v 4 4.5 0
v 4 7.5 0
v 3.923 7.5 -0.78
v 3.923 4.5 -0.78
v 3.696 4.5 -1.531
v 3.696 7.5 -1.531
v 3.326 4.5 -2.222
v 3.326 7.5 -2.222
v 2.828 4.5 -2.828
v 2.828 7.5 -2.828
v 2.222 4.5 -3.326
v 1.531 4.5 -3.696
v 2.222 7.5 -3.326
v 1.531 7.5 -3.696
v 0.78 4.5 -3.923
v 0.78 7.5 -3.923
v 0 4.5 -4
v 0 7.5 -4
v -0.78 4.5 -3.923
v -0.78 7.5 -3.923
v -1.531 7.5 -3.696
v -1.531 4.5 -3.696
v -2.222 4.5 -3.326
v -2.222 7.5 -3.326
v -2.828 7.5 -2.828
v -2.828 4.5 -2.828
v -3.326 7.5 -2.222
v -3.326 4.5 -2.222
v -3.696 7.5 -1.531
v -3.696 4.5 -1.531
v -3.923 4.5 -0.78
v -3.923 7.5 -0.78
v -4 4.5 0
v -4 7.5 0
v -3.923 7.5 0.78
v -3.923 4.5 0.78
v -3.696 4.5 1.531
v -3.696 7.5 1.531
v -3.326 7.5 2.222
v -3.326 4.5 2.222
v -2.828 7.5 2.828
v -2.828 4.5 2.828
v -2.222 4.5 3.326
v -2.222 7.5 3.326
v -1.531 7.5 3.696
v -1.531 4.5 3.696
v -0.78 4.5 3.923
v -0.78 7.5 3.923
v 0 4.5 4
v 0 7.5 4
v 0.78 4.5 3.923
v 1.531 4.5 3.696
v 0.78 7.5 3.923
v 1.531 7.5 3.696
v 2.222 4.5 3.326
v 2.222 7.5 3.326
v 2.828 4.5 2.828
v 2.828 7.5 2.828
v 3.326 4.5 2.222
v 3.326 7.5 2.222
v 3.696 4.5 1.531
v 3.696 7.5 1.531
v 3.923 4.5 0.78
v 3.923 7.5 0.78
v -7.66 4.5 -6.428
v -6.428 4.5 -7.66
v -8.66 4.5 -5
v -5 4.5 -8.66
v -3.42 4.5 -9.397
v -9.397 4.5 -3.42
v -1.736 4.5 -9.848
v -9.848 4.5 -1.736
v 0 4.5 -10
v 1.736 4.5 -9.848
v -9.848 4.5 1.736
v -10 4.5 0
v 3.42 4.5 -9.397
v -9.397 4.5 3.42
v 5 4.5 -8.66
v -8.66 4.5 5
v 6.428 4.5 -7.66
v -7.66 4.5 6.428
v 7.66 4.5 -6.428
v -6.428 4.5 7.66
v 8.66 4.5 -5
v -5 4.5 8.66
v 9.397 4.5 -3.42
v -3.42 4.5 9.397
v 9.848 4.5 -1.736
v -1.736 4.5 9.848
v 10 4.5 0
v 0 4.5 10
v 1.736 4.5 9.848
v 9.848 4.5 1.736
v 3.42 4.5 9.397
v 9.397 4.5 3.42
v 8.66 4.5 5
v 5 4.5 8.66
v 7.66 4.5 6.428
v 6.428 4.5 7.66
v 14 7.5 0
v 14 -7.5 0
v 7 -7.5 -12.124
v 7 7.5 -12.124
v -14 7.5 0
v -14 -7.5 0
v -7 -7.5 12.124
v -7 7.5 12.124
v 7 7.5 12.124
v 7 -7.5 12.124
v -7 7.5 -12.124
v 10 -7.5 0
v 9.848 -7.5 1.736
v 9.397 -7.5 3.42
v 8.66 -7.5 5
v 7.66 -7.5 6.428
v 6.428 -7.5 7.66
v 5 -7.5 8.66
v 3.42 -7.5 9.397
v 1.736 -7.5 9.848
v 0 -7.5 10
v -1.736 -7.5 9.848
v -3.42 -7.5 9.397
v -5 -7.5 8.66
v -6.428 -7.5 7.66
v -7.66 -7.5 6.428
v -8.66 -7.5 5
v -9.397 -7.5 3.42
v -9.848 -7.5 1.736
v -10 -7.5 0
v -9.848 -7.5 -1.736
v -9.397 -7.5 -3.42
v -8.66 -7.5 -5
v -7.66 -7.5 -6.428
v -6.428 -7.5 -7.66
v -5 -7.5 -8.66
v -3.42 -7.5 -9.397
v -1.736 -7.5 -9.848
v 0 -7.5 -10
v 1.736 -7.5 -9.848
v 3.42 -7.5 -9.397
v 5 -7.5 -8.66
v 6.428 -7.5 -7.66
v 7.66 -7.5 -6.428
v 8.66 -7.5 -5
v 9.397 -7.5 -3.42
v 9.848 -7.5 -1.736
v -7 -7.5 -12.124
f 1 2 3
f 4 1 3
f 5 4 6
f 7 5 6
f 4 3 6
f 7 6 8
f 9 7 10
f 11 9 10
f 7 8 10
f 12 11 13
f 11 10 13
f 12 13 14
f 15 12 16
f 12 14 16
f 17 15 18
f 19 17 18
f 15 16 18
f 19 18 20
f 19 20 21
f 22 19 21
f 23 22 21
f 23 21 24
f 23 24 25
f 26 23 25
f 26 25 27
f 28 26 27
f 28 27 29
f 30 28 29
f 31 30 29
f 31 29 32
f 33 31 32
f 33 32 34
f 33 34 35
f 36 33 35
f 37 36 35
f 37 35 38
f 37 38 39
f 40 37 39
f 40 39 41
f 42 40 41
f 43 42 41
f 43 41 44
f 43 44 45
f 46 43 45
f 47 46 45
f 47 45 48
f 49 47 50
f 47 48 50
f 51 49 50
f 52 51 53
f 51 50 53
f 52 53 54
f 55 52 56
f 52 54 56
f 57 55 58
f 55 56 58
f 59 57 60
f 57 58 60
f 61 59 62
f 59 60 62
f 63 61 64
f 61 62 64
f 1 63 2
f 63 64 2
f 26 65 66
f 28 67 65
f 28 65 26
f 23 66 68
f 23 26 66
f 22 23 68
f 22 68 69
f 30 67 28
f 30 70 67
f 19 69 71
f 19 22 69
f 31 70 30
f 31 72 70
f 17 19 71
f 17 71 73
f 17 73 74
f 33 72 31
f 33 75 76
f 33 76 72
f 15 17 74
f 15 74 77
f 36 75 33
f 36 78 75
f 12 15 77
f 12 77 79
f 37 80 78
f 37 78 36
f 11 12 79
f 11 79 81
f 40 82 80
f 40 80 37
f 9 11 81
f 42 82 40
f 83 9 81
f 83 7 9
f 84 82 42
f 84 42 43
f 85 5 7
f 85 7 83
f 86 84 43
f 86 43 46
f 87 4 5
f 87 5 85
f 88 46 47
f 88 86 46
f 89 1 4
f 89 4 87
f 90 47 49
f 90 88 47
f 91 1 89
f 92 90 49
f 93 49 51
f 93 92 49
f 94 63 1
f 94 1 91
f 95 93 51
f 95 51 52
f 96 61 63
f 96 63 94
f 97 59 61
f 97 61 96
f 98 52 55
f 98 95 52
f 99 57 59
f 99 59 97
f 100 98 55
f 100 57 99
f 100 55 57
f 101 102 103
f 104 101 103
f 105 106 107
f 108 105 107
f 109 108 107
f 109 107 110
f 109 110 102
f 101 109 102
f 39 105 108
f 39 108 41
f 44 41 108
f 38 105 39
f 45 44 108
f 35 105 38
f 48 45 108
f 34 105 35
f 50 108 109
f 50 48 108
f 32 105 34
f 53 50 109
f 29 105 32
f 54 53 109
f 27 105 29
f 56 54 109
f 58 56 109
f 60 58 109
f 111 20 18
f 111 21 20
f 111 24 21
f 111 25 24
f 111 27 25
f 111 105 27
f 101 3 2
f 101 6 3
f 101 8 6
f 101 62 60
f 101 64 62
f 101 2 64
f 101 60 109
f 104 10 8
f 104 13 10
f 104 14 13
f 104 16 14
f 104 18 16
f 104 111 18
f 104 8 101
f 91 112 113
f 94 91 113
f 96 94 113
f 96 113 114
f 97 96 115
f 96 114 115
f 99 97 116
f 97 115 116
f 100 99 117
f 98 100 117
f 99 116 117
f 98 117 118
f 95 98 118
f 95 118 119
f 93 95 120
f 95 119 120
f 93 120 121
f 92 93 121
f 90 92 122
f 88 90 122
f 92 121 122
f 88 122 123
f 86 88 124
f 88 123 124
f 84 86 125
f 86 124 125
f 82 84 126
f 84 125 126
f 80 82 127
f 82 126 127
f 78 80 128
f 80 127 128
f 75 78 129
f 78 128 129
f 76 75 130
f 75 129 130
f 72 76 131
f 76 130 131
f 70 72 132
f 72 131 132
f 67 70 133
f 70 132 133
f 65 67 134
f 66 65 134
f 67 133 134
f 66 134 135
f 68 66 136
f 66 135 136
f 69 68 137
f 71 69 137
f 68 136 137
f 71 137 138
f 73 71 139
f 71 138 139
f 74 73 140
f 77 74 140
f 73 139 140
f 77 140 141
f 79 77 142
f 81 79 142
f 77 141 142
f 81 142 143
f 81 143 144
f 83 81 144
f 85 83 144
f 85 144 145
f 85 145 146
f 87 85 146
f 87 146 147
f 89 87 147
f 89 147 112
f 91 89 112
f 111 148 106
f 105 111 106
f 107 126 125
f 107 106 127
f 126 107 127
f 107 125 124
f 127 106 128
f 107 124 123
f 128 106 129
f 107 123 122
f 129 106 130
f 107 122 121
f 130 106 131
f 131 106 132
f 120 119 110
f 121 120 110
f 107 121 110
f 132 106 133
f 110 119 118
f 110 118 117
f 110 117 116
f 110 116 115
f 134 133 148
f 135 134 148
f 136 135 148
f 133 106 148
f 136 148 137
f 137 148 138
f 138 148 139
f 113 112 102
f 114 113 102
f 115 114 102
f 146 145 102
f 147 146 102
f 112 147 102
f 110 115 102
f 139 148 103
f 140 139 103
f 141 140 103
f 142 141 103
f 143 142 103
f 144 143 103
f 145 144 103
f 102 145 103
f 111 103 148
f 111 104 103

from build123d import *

# Parameters (mm, degrees)
BOSS_EXTRUDE1_DEPTH = 7.5
SKETCH2_R           = 10
CUT_EXTRUDE2_DEPTH  = 12
SKETCH3_R           = 4
CUT_EXTRUDE3_DEPTH  = 16


with BuildPart() as part:
    # Sketch1 → Boss-Extrude1 (new body, symmetric)
    with BuildSketch(Plane(origin=(0, 0, 0), x_dir=(1, 0, 0), z_dir=(0, 1, 0))):
        Polygon((-14, 0), (-7, -12.124355653), (7, -12.124355653), (14, 0), (7, 12.124355653), (-7, 12.124355653), align=None)
    extrude(amount=BOSS_EXTRUDE1_DEPTH, both=True)

    # Sketch2 → Cut-Extrude2 (cut)
    with BuildSketch(Plane.XZ.offset(7.5)):
        Circle(SKETCH2_R)
    extrude(amount=-CUT_EXTRUDE2_DEPTH, mode=Mode.SUBTRACT)

    # Sketch3 → Cut-Extrude3 (cut, through all)
    with BuildSketch(Plane(origin=(0, 7.5, 0), x_dir=(1, 0, 0), z_dir=(0, 1, 0))):
        Circle(SKETCH3_R)
    extrude(amount=-CUT_EXTRUDE3_DEPTH, mode=Mode.SUBTRACT)


solid = part.part
